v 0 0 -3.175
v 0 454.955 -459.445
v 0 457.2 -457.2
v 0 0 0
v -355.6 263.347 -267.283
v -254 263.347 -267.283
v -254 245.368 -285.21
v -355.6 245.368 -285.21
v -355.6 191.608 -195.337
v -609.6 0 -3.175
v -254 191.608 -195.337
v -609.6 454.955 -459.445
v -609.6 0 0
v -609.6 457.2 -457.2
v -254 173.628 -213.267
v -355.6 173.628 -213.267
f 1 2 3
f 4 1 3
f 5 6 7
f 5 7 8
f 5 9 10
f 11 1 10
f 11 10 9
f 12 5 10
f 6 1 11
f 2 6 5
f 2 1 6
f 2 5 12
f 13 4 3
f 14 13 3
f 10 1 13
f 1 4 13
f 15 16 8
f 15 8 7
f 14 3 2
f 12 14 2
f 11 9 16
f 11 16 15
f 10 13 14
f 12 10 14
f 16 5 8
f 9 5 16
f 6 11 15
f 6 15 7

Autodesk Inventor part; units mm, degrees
ref_plane "YZ Plane" through (0, 0, 0) normal (1, 0, 0) x (0, 1, 0)
ref_plane "XZ Plane" through (0, 0, 0) normal (0, 1, 0) x (-1, 0, 0)
ref_plane "XY Plane" through (0, 0, 0) normal (0, 0, 1) x (1, 0, 0)
sketch "Sketch6" plane through (0, 0, 0) normal (0, 1, 0) x (-1, 0, 0)
  line L0 (0, 0) -> (609.6, 0)
  line L1 (609.6, 0) -> (609.6, -914.4)
  line L2 (609.6, -914.4) -> (0, -914.4)
  line L3 (0, -914.4) -> (0, 0)
  dimension "d21" = 609.6
  dimension "d22" = 914.4
extrude "Extrusion6" add sketch "Sketch6" along normal blind 609.6
sketch "Sketch8" plane through (0, 0, 0) normal (1, 0, 0) x (0, 0, -1)
  line L0 (0, 609.6) -> (914.4, 609.6) projected
  line L1 (0, 0) -> (457.2, 0) construction
  line L2 (0, 0) -> (457.2, 457.2)
  line L3 (0, 0) -> (646.5784, 0) construction
  line L4 (457.2, 457.2) -> (914.4, 0)
  line L5 (457.2, 457.2) -> (459.4451, 454.9549)
  line L6 (0, 0) -> (3.175, 0)
  line L7 (3.175, 0) -> (459.4451, 454.9549)
  dimension "d29" = 45
  dimension "d30" = 3.175
  dimension "d31" = 3.175
extrude "Extrusion7" cut sketch "Sketch8" against normal blind 609.6 keep common part
sketch "Sketch10" plane through (-609.6, 0, -3.175) normal (0, -0.7081, -0.7061) x (1, 0, 0)
  line L0 (609.6, -644.334) -> (609.6, 0) projected
  line L1 (609.6, 0) -> (0, 0) projected
  line L2 (0, 0) -> (0, -644.334) projected
  line L3 (609.6, -644.334) -> (0, -644.334) projected
  line L4 (609.6, -644.3295) -> (0, -644.3295) projected
  line L5 (304.8, -644.3295) -> (304.8, 2.2483)
  line L6 (609.6, 2.2483) -> (0, 2.2483) projected
  line L7 (609.6, -322.167) -> (0, -322.167)
  line L8 (254, -271.367) -> (355.6, -271.367)
  line L9 (355.6, -271.367) -> (355.6, -372.967)
  line L10 (355.6, -372.967) -> (254, -372.967)
  line L11 (254, -372.967) -> (254, -271.367)
  line L12 (254, -271.367) -> (355.6, -372.967) construction
  line L13 (355.6, -271.367) -> (254, -372.967) construction
  point P0 (304.8, -322.167)
  dimension "d37" = 101.6
  dimension "d38" = 101.6
extrude "Extrusion8" add sketch "Sketch10" along normal blind 25.4 contours L9 L10 L5 L7 | L7 L5 L8 L9 | L10 L11 L7 L5 | L7 L11 L8 L5
properties part number "BackV1" material "Aluminum 6061"
